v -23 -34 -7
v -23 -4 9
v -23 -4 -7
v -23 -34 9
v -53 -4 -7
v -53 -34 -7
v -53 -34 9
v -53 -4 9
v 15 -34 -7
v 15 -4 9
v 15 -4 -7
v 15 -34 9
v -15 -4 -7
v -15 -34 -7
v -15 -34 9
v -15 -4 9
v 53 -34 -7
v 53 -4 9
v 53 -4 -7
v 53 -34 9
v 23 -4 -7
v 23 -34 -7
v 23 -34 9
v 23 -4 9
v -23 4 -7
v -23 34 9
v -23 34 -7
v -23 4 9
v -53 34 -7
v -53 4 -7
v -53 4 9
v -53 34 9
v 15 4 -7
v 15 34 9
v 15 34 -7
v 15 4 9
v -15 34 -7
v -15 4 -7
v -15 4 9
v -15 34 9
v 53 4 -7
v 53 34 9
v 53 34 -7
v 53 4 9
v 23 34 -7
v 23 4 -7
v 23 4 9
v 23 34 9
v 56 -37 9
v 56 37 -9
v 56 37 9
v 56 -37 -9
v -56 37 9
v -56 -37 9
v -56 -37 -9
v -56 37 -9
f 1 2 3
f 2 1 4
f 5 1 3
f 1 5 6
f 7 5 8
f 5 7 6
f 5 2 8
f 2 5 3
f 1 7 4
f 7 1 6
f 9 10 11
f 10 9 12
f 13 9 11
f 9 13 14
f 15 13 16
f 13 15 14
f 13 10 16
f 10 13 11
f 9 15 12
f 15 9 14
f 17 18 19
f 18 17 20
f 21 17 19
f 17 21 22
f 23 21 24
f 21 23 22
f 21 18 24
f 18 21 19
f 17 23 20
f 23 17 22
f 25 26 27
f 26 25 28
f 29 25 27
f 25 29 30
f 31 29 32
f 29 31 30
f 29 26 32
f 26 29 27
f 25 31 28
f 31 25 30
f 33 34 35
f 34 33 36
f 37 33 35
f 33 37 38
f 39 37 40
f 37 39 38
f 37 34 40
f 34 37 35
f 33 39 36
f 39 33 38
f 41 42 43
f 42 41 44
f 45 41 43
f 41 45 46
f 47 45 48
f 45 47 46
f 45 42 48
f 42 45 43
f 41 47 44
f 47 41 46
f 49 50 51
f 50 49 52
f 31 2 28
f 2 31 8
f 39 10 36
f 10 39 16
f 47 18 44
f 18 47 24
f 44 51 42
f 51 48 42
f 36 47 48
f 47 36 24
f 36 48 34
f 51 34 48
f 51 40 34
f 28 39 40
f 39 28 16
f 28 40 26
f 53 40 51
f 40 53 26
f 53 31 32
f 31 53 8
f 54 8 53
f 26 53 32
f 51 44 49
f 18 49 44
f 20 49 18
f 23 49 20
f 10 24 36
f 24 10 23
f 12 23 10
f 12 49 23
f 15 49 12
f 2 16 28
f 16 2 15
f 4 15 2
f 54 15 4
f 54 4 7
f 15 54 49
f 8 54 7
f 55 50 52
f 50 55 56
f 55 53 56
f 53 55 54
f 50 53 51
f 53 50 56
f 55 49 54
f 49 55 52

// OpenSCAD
$fn = 32;

// ----------------------------------------------------------------------
// Pocket plate 112 x 74 x 18
// 2 x 3 pockets 30 mm square, 16 mm deep
// ----------------------------------------------------------------------

// --- parameters (mm) ---
thickness = 18;  // plate thickness
floor_t = 2;     // material left under each pocket
pocket = 30;     // pocket side length
pitch_x = 38;    // pocket pitch along X
pitch_y = 38;    // pocket pitch along Y
cols = 3;        // pockets per row
rows = 2;        // rows of pockets

// --- derived feature positions (mm) ---
depth = thickness - floor_t;        // = 16   pocket depth, down to the floor
span_x = (cols - 1) * pitch_x;      // = 76   distance between outer pockets
span_y = (rows - 1) * pitch_y;      // = 38   distance between outer pocket rows
origin_x = -span_x / 2;             // = -38   X of the first pocket
origin_y = -span_y / 2;             // = -19   Y of the first pocket
plate = [span_x + pocket + 6, span_y + pocket + 6, thickness];  // = [112, 74, 18]   overall size: pockets plus 3 mm of wall on each side
feature_centers = [
  [origin_x + 0 * pitch_x, origin_y + 0 * pitch_y],
  [origin_x + 1 * pitch_x, origin_y + 0 * pitch_y],
  [origin_x + 2 * pitch_x, origin_y + 0 * pitch_y],
  [origin_x + 0 * pitch_x, origin_y + 1 * pitch_y],
  [origin_x + 1 * pitch_x, origin_y + 1 * pitch_y],
  [origin_x + 2 * pitch_x, origin_y + 1 * pitch_y]
];   // pocket centres, used verbatim by the cutter loop

// plate outline, then one pocket per centre in feature_centers
difference() {
  cube(plate, center = true);
  for (centre = feature_centers)
    translate([centre[0] - pocket / 2, centre[1] - pocket / 2, plate[2] / 2 - depth])
      cube([pocket, pocket, depth + 1]);  // centred on the declared pocket centre
}
